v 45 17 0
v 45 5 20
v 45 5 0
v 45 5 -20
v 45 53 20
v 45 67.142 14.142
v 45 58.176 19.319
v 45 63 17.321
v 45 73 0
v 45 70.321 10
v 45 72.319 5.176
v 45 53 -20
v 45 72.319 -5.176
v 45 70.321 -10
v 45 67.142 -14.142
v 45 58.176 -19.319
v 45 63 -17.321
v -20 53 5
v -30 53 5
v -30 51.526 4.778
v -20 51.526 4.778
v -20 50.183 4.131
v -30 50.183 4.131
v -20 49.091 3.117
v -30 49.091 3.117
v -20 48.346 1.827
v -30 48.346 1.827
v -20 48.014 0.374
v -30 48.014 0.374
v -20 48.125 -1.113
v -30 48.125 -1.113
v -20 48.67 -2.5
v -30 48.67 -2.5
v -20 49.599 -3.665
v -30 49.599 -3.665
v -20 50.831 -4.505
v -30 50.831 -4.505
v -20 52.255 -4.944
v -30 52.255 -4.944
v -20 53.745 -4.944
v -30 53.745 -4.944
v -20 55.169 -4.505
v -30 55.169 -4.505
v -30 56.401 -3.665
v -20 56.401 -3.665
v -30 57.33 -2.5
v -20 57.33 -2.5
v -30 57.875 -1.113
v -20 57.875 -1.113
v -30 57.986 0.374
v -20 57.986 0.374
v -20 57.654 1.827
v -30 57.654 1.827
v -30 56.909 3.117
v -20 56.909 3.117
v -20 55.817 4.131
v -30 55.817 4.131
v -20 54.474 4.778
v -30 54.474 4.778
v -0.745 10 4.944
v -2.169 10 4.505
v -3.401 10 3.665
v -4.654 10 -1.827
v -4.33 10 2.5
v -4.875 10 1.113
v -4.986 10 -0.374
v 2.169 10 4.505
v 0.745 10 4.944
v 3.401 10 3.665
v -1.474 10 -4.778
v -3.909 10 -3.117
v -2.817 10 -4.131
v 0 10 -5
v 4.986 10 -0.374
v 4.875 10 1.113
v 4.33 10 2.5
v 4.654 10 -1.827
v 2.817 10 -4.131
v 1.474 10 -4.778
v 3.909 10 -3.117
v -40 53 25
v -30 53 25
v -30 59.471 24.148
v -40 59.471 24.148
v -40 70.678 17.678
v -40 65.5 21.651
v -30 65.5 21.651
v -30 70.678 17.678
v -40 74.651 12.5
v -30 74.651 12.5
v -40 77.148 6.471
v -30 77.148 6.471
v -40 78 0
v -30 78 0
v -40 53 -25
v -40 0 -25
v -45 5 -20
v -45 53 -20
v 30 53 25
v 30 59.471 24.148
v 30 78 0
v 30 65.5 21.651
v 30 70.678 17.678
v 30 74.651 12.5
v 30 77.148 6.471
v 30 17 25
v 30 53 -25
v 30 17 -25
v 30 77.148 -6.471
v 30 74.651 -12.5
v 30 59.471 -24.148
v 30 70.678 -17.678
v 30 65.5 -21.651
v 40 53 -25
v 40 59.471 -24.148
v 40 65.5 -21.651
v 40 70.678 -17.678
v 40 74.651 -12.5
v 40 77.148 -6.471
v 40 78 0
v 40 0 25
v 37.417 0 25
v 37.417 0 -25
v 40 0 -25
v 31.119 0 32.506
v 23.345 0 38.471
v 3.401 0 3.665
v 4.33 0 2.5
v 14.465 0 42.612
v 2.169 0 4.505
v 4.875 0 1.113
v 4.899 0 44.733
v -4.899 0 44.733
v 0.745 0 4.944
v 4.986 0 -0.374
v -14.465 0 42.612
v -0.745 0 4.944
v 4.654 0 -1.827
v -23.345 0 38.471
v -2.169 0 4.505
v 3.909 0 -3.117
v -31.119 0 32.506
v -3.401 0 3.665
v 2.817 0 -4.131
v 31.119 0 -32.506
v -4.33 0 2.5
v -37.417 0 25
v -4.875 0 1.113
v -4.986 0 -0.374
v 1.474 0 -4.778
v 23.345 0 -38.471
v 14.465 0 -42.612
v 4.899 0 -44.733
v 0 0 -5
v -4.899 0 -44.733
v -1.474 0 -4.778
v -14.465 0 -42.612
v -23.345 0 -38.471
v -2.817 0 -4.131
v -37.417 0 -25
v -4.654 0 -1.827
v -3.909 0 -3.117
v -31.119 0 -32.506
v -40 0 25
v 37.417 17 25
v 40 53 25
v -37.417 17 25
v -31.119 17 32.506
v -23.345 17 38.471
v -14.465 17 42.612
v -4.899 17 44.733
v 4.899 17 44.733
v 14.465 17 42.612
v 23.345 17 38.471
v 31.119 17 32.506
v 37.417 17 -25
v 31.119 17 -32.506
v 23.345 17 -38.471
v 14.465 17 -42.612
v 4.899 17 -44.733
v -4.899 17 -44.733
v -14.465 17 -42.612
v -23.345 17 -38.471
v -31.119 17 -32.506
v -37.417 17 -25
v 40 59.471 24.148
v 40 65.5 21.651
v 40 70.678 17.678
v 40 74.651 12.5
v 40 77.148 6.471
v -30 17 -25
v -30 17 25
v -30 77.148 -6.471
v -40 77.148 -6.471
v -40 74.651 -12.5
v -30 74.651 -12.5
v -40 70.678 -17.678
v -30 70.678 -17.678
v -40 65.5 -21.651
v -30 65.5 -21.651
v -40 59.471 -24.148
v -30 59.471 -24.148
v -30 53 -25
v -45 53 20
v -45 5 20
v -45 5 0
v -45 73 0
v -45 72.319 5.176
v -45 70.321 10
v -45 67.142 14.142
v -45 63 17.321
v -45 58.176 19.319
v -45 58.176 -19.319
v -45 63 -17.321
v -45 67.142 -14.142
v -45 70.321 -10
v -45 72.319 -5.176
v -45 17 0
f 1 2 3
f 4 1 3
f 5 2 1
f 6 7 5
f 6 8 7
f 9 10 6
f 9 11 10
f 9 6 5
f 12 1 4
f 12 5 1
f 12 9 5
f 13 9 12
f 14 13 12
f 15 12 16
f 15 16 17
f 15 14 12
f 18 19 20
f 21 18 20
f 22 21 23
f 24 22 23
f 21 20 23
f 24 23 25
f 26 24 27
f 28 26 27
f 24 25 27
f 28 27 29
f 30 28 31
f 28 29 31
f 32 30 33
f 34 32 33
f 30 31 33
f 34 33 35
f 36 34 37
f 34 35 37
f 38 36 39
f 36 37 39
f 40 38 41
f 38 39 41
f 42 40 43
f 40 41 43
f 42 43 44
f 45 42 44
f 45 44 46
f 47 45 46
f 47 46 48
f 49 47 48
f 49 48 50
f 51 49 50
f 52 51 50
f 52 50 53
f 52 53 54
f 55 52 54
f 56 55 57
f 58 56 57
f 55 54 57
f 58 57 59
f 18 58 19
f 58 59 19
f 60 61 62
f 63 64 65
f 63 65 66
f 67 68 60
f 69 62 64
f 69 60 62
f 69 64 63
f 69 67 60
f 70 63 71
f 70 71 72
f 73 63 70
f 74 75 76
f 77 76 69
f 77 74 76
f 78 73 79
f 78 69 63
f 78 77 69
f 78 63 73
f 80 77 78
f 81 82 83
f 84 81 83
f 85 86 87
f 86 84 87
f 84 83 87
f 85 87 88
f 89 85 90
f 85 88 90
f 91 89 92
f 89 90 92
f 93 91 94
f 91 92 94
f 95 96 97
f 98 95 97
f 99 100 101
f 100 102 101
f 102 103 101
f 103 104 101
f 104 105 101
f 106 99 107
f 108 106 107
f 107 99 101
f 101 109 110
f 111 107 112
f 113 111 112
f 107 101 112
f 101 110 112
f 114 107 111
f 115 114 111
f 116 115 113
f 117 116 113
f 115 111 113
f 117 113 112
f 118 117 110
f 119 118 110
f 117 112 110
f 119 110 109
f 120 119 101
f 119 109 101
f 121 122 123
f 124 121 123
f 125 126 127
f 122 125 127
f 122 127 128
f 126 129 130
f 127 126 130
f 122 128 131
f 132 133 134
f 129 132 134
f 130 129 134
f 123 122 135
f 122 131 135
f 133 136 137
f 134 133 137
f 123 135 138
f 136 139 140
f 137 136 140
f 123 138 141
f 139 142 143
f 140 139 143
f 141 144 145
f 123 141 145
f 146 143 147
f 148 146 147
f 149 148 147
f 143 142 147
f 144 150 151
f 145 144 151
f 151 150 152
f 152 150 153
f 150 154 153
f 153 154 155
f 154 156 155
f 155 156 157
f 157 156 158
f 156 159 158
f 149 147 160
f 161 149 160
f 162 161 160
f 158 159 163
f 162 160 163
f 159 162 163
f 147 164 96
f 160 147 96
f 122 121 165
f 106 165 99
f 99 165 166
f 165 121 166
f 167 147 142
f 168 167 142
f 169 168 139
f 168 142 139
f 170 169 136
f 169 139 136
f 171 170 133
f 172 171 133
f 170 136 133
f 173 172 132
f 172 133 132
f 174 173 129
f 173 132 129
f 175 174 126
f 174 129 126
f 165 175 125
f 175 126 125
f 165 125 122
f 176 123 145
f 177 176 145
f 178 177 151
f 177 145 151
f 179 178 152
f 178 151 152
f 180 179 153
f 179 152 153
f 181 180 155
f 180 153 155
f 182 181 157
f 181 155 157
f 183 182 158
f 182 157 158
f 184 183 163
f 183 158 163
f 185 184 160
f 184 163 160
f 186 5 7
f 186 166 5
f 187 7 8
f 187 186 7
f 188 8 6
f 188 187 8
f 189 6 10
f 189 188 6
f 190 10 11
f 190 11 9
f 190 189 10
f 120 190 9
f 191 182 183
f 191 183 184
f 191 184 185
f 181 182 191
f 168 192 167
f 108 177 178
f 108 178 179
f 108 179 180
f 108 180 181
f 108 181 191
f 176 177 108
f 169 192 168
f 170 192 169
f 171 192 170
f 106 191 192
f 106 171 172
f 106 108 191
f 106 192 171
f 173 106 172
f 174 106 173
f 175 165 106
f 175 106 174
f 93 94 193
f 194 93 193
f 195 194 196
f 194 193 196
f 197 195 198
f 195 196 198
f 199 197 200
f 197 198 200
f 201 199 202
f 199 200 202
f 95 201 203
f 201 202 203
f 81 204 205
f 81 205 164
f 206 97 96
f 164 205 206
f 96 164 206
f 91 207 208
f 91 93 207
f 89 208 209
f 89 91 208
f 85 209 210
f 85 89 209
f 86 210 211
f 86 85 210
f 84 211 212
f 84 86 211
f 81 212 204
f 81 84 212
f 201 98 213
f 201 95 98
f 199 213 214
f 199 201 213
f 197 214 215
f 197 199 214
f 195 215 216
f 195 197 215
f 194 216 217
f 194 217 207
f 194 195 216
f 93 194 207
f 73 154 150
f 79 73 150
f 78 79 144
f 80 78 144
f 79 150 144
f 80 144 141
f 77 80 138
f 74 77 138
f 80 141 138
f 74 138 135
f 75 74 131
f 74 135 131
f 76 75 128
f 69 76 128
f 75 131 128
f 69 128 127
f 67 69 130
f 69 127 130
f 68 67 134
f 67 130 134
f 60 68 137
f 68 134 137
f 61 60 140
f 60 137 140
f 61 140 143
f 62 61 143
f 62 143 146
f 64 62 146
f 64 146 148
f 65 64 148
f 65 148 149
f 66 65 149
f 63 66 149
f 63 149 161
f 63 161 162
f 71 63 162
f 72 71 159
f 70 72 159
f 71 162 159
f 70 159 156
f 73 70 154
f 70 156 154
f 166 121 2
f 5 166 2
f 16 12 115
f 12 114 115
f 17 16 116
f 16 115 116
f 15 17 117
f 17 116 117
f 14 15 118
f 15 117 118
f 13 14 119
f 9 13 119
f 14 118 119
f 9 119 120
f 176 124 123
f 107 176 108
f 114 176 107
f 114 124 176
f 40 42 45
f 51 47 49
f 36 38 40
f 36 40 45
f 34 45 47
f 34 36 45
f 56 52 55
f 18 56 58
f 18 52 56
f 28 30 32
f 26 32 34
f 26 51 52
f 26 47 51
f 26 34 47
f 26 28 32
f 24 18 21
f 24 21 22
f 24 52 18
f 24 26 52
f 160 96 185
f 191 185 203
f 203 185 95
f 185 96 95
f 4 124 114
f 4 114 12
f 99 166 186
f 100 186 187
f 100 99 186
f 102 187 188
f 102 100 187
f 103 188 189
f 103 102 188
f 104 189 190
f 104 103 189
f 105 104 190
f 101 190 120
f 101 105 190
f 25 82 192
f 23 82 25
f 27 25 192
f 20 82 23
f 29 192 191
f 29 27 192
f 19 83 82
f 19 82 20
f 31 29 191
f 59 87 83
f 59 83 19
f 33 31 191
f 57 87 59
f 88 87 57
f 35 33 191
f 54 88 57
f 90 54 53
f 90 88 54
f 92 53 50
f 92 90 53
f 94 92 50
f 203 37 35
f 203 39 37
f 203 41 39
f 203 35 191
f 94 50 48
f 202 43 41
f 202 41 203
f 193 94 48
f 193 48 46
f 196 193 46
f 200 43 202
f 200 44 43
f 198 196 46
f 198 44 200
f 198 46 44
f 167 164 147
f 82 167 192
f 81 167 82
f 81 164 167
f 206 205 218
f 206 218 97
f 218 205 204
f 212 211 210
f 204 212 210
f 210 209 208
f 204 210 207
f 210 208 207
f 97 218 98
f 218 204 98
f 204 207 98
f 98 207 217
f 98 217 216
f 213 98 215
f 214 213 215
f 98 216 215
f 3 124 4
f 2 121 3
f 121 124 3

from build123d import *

# Parameters (mm, degrees)
SKETCH1_R           = 45
BOSS_EXTRUDE1_DEPTH = 17
SKETCH2_W           = 50
SKETCH2_H           = 78
BOSS_EXTRUDE2_DEPTH = 15
SKETCH3_W           = 50
SKETCH3_H           = 78
BOSS_EXTRUDE3_DEPTH = 15
FILLET1_R           = 25
CHAMFER1_SIZE       = 5
SKETCH4_R           = 5
BOSS_EXTRUDE4_DEPTH = 10
SKETCH5_R           = 5
CUT_EXTRUDE1_DEPTH  = 10


# Some blends are built 0.0001 mm under size
with BuildPart() as part:
    # Sketch1 → Boss-Extrude1 (new body)
    with BuildSketch(Plane(origin=(0, 0, 0), x_dir=(1, 0, 0), z_dir=(0, 1, 0))):
        with Locations(Location((0, 0, 0), (0, 0, 270))):
            Circle(SKETCH1_R)
    extrude(amount=BOSS_EXTRUDE1_DEPTH)

    # Sketch2 → Boss-Extrude2 (add)
    with BuildSketch(Plane(origin=(45, 0, 0), x_dir=(0, 0, -1), z_dir=(1, 0, 0))):
        with Locations((0, 39)):
            Rectangle(SKETCH2_W, SKETCH2_H)
    extrude(amount=-BOSS_EXTRUDE2_DEPTH)

    # Sketch3 → Boss-Extrude3 (add)
    with BuildSketch(Plane(origin=(-45, 0, 0), x_dir=(0, 0, -1), z_dir=(1, 0, 0))):
        with Locations((0, 39)):
            Rectangle(SKETCH3_W, SKETCH3_H)
    extrude(amount=BOSS_EXTRUDE3_DEPTH)

    # Fillet1
    fillet1_edges = [part.edges().sort_by_distance(p)[0] for p in [
        (37.5, 78, -25),
        (37.5, 78, 25),
        (-37.5, 78, 25),
        (-37.5, 78, -25),
    ]]
    fillet(fillet1_edges, radius=FILLET1_R - 0.0001)  # a hair under: the kernel refuses the full size

    # Chamfer1
    # the kernel refuses this chamfer: 5 mm, written as the material it takes off along each edge
    with BuildSketch(Plane(origin=(45, 0, 5.6e-08), x_dir=(-0.9996219169112968, -0.027495876610585467, 0), z_dir=(0, 0, -1))) as chamfer1_piece_1:
        Polygon((CHAMFER1_SIZE * 0.999621916911, CHAMFER1_SIZE * 0.0274958766106), (-CHAMFER1_SIZE * 0.0274958766106, CHAMFER1_SIZE * 0.999621916911), (0, 0), align=None)
    chamfer1_piece_1_solid = extrude(amount=37.858414995, mode=Mode.PRIVATE)
    with BuildSketch(Plane(origin=(45, -12.85841494, -25), x_dir=(-0.9996219169112968, 0, -0.027495876610586317), z_dir=(0, 1, 0)), Plane(origin=(45, 53.0001, 25), x_dir=(-0.9996219169112968, 0, 0.027495876610586317), z_dir=(0, -1, 0)), Plane(origin=(-45, 53.0001, 25), x_dir=(-0.027495876610586317, 0, -0.9996219169112968), z_dir=(0, -1, 0))) as chamfer1_piece_2:
        Polygon((CHAMFER1_SIZE * 0.999621916911, CHAMFER1_SIZE * 0.0274958766106), (-CHAMFER1_SIZE * 0.0274958766106, CHAMFER1_SIZE * 0.999621916911), (0, 0), align=None)
    chamfer1_piece_2_solid = extrude(amount=65.85851494, mode=Mode.PRIVATE)
    with BuildSketch(Plane(origin=(-45, 0, 37.85841494), x_dir=(-0.027495876610586317, 0.9996219169112968, 0), z_dir=(0, 0, -1))) as chamfer1_piece_3:
        Polygon((CHAMFER1_SIZE * 0.999621916911, CHAMFER1_SIZE * 0.0274958766106), (-CHAMFER1_SIZE * 0.0274958766106, CHAMFER1_SIZE * 0.999621916911), (0, 0), align=None)
    chamfer1_piece_3_solid = extrude(amount=37.85841513, mode=Mode.PRIVATE)
    with BuildSketch(Plane(origin=(-45, -12.85841494, -25), x_dir=(0.9996219169112968, 0, -0.027495876610586317), z_dir=(0, 1, 0))) as chamfer1_piece_4:
        Polygon((CHAMFER1_SIZE * 0.999621916911, -CHAMFER1_SIZE * 0.0274958766106), (-CHAMFER1_SIZE * 0.0274958766106, -CHAMFER1_SIZE * 0.999621916911), (0, 0), align=None)
    chamfer1_piece_4_solid = extrude(amount=65.85851494, mode=Mode.PRIVATE)
    with BuildSketch(Plane(origin=(45, 53.0001, 0.0001), x_dir=(0, 0, 1), z_dir=(0, -1, 0))) as chamfer1_piece_5:
        Polygon((24.9999 - CHAMFER1_SIZE, 0), (24.9999, CHAMFER1_SIZE), (24.9999, 0), align=None)
    chamfer1_piece_5_solid = revolve(axis=Axis((45, 53.0001, 0.0001), (-1, 0, 0)), revolution_arc=90, mode=Mode.PRIVATE)
    with BuildSketch(Plane(origin=(45, 53.0001, -0.0001), x_dir=(0, 0, -1), z_dir=(0, -1, 0))) as chamfer1_piece_6:
        Polygon((24.9999 - CHAMFER1_SIZE, 0), (24.9999, -CHAMFER1_SIZE), (24.9999, 0), align=None)
    chamfer1_piece_6_solid = revolve(axis=Axis((45, 53.0001, -0.0001), (1, 0, 0)), revolution_arc=90, mode=Mode.PRIVATE)
    with BuildSketch(Plane(origin=(-45, 53.0001, -0.0001), x_dir=(0, 0, -1), z_dir=(0, -1, 0))) as chamfer1_piece_7:
        Polygon((24.9999 - CHAMFER1_SIZE, 0), (24.9999, CHAMFER1_SIZE), (24.9999, 0), align=None)
    chamfer1_piece_7_solid = revolve(axis=Axis((-45, 53.0001, -0.0001), (1, 0, 0)), revolution_arc=90, mode=Mode.PRIVATE)
    with BuildSketch(Plane(origin=(-45, 53.0001, 0.0001), x_dir=(0, 1, 0), z_dir=(0, 0, -1))) as chamfer1_piece_8:
        Polygon((24.9999 - CHAMFER1_SIZE, 0), (24.9999, CHAMFER1_SIZE), (24.9999, 0), align=None)
    chamfer1_piece_8_solid = revolve(axis=Axis((-45, 53.0001, 0.0001), (1, 0, 0)), revolution_arc=90, mode=Mode.PRIVATE)
    with BuildSketch(Plane(origin=(-45, 78, -0.0001), x_dir=(-0.027495876610586282, -0.9996219169112968, 0), z_dir=(0, 0, 1))) as chamfer1_piece_9:
        Polygon((CHAMFER1_SIZE * 0.999621916911, CHAMFER1_SIZE * 0.0274958766106), (-CHAMFER1_SIZE * 0.0274958766106, CHAMFER1_SIZE * 0.999621916911), (0, 0), align=None)
    chamfer1_piece_9_solid = extrude(amount=0.0002, mode=Mode.PRIVATE)
    with BuildSketch(Plane(origin=(45, 78, -0.0001), x_dir=(0.027495876610586282, -0.9996219169112968, 0), z_dir=(0, 0, 1))) as chamfer1_piece_10:
        Polygon((CHAMFER1_SIZE * 0.999621916911, -CHAMFER1_SIZE * 0.0274958766106), (-CHAMFER1_SIZE * 0.0274958766106, -CHAMFER1_SIZE * 0.999621916911), (0, 0), align=None)
    chamfer1_piece_10_solid = extrude(amount=0.0002, mode=Mode.PRIVATE)
    with BuildSketch(Plane(origin=(-45, 0, -1.91e-07), x_dir=(-0.027495876610586334, 0.9996219169112968, 0), z_dir=(0, 0, -1))) as chamfer1_piece_11:
        Polygon((CHAMFER1_SIZE * 0.999621916911, CHAMFER1_SIZE * 0.0274958766106), (-CHAMFER1_SIZE * 0.0274958766106, CHAMFER1_SIZE * 0.999621916911), (0, 0), align=None)
    chamfer1_piece_11_solid = extrude(amount=37.858414749, mode=Mode.PRIVATE)
    with BuildSketch(Plane(origin=(45, 0, 37.85841494), x_dir=(-0.9996219169112968, -0.027495876610586372, 0), z_dir=(0, 0, -1))) as chamfer1_piece_12:
        Polygon((CHAMFER1_SIZE * 0.999621916911, CHAMFER1_SIZE * 0.0274958766106), (-CHAMFER1_SIZE * 0.0274958766106, CHAMFER1_SIZE * 0.999621916911), (0, 0), align=None)
    chamfer1_piece_12_solid = extrude(amount=37.858414884, mode=Mode.PRIVATE)
    add([chamfer1_piece_1_solid, chamfer1_piece_2_solid, chamfer1_piece_3_solid, chamfer1_piece_4_solid, chamfer1_piece_5_solid, chamfer1_piece_6_solid, chamfer1_piece_7_solid, chamfer1_piece_8_solid, chamfer1_piece_9_solid, chamfer1_piece_10_solid, chamfer1_piece_11_solid, chamfer1_piece_12_solid], mode=Mode.SUBTRACT)

    # Sketch4 → Boss-Extrude4 (add)
    with BuildSketch(Plane(origin=(-30, 0, 0), x_dir=(0, 0, -1), z_dir=(1, 0, 0))):
        with Locations(Location((0, 53, 0), (0, 0, 180))):
            Circle(SKETCH4_R)
    extrude(amount=BOSS_EXTRUDE4_DEPTH)

    # Sketch5 → Cut-Extrude1 (cut)
    with BuildSketch(Plane(origin=(0, 0, 0), x_dir=(-1, 0, 0), z_dir=(0, -1, 0))):
        with Locations(Location((0, 0, 0), (0, 0, 90))):
            Circle(SKETCH5_R)
    extrude(amount=-CUT_EXTRUDE1_DEPTH, mode=Mode.SUBTRACT)


solid = part.part
